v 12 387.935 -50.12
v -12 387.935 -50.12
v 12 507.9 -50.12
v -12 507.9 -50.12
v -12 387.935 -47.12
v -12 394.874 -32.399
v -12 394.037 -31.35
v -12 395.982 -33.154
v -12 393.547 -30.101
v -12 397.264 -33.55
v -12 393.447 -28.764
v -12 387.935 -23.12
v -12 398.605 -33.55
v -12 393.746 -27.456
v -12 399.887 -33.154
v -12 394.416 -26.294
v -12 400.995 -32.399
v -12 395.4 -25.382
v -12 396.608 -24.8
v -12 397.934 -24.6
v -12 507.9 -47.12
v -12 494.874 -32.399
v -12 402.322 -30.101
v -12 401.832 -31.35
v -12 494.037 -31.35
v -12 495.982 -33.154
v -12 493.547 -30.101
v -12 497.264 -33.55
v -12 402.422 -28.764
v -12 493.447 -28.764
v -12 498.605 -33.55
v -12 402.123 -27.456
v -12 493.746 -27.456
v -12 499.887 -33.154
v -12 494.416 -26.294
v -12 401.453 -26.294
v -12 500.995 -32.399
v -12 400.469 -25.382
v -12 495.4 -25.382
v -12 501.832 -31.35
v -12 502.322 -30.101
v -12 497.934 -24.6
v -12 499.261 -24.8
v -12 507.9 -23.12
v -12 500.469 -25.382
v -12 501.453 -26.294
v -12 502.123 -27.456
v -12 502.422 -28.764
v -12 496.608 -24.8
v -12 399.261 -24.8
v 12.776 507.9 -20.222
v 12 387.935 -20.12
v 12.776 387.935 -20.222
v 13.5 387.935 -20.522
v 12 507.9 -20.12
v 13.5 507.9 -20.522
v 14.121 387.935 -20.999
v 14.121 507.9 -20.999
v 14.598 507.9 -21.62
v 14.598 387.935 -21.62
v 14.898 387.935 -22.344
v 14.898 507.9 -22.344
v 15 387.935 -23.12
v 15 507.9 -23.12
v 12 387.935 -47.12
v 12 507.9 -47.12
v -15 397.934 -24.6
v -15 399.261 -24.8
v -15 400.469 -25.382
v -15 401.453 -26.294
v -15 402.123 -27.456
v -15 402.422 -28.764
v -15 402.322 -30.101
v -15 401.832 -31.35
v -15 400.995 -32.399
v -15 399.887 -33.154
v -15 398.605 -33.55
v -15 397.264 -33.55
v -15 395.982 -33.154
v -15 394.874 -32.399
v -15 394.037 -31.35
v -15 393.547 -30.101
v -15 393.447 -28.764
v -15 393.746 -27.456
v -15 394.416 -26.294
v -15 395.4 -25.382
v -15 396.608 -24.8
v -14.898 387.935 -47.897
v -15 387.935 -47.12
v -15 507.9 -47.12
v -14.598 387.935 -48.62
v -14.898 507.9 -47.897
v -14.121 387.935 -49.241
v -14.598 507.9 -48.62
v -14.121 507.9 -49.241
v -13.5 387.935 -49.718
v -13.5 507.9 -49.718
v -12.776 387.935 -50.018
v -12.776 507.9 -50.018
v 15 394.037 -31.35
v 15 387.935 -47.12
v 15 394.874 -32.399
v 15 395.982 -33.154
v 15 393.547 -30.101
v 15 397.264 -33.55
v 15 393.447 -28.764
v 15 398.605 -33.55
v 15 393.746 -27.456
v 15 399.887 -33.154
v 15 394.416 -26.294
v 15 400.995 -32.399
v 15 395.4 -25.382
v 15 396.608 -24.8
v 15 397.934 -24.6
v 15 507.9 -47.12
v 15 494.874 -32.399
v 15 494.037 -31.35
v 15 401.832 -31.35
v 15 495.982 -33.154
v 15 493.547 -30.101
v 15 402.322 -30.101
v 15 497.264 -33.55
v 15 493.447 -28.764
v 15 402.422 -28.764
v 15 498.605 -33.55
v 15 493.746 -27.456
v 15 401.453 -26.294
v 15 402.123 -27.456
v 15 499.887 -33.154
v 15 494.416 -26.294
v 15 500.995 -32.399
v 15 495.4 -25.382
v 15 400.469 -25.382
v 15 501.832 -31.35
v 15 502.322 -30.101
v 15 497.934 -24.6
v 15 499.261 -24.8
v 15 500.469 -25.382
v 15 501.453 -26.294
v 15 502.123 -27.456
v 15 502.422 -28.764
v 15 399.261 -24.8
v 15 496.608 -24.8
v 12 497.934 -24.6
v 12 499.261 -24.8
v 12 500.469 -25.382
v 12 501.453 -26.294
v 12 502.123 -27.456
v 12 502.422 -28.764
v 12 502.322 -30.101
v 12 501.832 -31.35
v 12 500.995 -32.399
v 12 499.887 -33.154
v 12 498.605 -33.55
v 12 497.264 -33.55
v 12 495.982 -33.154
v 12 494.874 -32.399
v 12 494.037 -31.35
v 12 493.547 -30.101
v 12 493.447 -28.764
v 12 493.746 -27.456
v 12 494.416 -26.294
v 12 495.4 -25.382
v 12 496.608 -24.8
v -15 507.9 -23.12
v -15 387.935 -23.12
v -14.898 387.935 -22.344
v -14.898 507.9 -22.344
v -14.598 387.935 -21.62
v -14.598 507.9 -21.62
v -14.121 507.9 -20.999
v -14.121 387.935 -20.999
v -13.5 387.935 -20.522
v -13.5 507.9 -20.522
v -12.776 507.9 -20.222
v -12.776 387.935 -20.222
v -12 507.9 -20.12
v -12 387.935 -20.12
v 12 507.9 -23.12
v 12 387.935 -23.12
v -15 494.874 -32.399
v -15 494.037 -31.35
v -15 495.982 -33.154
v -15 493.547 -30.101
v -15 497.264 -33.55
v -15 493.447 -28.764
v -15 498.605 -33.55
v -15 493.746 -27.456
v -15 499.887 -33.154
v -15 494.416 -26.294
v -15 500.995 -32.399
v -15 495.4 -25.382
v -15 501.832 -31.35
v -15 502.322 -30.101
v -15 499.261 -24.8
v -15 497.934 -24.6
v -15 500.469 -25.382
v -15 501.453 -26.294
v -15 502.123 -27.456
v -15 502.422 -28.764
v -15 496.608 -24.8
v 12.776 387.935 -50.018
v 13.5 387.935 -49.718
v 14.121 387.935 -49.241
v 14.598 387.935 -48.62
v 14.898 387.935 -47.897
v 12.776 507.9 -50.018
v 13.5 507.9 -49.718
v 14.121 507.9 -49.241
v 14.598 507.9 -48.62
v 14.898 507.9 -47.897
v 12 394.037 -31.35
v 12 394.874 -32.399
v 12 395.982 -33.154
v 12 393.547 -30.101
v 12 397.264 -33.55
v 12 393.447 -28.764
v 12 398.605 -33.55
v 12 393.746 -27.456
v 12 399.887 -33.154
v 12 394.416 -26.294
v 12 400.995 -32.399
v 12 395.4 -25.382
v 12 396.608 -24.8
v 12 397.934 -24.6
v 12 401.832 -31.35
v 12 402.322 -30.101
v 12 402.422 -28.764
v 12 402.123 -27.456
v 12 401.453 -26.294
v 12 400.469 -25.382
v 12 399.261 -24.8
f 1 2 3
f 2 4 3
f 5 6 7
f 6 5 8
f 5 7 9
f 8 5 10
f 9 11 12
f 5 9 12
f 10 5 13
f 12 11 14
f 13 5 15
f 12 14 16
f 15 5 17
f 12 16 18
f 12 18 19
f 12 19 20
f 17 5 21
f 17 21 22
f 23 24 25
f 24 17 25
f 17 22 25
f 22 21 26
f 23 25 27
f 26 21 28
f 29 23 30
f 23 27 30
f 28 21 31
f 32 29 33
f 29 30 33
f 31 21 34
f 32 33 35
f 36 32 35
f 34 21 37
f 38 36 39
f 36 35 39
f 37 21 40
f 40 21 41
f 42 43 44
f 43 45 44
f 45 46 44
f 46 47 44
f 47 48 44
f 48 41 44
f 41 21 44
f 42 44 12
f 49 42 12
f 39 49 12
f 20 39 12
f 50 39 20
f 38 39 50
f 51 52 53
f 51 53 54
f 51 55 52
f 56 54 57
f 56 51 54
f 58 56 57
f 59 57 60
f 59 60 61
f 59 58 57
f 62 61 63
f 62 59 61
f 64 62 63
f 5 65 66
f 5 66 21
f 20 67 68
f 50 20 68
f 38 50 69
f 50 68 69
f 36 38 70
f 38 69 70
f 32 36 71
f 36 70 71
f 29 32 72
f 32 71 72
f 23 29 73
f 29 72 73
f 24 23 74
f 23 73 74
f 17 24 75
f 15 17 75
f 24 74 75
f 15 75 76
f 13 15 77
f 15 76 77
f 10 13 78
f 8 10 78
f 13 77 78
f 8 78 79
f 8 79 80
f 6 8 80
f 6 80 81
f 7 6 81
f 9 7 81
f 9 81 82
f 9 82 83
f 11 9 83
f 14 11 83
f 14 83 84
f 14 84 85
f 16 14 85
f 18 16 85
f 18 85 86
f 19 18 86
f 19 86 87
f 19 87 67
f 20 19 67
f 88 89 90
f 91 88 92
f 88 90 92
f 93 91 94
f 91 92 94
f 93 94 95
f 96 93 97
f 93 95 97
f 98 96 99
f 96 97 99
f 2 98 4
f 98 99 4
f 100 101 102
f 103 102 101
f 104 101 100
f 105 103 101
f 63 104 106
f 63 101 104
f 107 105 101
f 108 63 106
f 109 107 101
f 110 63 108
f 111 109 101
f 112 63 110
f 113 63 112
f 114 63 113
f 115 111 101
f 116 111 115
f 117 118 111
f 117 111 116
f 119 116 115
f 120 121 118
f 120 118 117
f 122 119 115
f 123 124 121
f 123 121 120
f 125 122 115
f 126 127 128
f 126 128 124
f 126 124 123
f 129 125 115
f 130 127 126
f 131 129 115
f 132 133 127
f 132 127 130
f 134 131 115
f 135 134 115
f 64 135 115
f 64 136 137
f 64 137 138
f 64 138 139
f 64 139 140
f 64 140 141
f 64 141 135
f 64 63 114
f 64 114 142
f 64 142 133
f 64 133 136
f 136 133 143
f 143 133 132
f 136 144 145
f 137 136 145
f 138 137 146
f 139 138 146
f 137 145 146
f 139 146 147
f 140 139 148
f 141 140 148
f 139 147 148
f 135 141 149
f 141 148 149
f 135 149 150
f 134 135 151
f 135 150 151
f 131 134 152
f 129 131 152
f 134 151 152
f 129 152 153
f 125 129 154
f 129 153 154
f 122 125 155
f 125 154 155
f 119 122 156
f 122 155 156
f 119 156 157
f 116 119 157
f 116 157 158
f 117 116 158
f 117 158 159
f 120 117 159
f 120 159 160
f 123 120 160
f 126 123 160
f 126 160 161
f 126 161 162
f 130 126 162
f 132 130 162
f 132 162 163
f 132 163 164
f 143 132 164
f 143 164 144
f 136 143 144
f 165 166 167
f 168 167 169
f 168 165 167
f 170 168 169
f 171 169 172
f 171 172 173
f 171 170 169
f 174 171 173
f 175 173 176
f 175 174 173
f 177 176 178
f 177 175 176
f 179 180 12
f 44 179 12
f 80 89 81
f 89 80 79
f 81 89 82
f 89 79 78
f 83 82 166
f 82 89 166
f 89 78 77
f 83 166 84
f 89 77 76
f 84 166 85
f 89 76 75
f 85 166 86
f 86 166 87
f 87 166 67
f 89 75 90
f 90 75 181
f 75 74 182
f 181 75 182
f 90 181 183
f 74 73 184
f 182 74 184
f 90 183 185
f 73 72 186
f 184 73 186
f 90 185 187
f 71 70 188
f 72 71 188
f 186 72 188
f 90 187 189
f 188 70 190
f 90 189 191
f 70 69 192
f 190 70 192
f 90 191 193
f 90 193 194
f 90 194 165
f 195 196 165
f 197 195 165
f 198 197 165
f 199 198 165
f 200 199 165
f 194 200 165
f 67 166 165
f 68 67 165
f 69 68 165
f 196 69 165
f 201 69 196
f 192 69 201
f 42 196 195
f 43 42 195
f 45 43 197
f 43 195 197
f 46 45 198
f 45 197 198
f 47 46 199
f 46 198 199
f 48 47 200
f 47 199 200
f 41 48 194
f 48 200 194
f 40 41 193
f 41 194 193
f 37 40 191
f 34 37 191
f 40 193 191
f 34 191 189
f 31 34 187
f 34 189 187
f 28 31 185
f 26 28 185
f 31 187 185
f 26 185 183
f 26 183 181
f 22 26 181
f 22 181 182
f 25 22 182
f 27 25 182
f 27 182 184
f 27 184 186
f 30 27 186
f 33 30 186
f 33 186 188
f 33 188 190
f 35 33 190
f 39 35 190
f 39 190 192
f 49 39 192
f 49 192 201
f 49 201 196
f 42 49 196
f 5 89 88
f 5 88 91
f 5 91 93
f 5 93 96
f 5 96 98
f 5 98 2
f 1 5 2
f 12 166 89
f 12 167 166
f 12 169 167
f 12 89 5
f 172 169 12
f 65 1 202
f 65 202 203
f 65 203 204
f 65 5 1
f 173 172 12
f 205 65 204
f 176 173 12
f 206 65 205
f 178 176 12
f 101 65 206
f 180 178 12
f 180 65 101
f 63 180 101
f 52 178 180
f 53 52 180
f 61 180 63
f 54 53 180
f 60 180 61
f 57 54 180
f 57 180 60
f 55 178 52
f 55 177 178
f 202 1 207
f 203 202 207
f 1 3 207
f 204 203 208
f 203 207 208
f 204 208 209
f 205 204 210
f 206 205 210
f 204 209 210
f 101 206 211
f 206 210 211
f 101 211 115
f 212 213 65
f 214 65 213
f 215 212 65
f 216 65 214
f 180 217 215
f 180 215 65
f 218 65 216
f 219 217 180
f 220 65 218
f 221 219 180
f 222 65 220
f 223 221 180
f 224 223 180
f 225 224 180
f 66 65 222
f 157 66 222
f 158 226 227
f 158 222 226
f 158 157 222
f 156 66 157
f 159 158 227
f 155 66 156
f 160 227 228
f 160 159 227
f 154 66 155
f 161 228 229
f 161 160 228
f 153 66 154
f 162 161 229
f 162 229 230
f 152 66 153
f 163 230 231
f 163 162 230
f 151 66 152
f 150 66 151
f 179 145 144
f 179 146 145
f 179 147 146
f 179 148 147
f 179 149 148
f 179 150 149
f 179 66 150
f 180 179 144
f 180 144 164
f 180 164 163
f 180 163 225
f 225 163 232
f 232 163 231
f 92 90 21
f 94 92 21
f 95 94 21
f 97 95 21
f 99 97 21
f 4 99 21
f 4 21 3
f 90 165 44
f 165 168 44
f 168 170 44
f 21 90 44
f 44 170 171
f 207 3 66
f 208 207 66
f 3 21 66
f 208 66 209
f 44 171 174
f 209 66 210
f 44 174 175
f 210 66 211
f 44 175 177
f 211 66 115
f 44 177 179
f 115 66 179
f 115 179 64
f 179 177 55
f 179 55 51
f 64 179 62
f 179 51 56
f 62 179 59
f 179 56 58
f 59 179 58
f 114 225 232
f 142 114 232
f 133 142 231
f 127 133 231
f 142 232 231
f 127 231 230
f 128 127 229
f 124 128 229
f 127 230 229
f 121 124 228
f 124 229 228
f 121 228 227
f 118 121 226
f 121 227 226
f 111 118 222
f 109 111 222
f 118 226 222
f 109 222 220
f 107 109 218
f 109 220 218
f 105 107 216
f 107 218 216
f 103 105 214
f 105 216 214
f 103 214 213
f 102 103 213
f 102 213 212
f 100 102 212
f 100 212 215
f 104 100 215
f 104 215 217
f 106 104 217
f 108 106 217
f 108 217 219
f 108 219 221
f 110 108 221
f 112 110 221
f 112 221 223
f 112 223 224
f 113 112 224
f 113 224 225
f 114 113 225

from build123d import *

# Parameters (mm, degrees)
CROQUIS1_W                        = 30
CROQUIS1_H                        = 119.965463257
SALIENTE_EXTRUIR1_DEPTH           = 30
CROQUIS2_W                        = 24
CROQUIS2_H                        = 24
CORTAR_EXTRUIR1_DEPTH             = 120.965463257
DI_METRO_DE_TALADRO_9_0_9_1_D     = 9
DI_METRO_DE_TALADRO_9_0_9_1_DEPTH = 3
DI_METRO_DE_TALADRO_9_0_9_2_D     = 9
DI_METRO_DE_TALADRO_9_0_9_2_DEPTH = 30
REDONDEO1_R                       = 3


with BuildPart() as part:
    # Croquis1 → Saliente-Extruir1 (new body)
    with BuildSketch(Plane.XY.offset(-20.120137415)):
        with Locations((0, 447.917268372)):
            Rectangle(CROQUIS1_W, CROQUIS1_H)
    extrude(amount=-SALIENTE_EXTRUIR1_DEPTH)

    # Croquis2 → Cortar-Extruir1 (cut, through all)
    with BuildSketch(Plane(origin=(0, 507.9, 0), x_dir=(-1, 0, 0), z_dir=(0, 1, 0))):
        with Locations((0, -35.120137415)):
            Rectangle(CROQUIS2_W, CROQUIS2_H)
    extrude(amount=-CORTAR_EXTRUIR1_DEPTH, mode=Mode.SUBTRACT)

    # Diámetro de taladro Ø9.0 (9)1
    with Locations(Plane(origin=(-12, 0, 0), x_dir=(0, 0, -1), z_dir=(1, 0, 0))):
        with Locations((29.1, 397.9345), (29.1, 497.9345)):
            Hole(DI_METRO_DE_TALADRO_9_0_9_1_D / 2, depth=DI_METRO_DE_TALADRO_9_0_9_1_DEPTH)

    # Diámetro de taladro Ø9.0 (9)2
    with Locations(Plane(origin=(15, 0, 0), x_dir=(0, 0, -1), z_dir=(1, 0, 0))):
        with Locations((29.1, 497.9345), (29.1, 397.9345)):
            Hole(DI_METRO_DE_TALADRO_9_0_9_2_D / 2, depth=DI_METRO_DE_TALADRO_9_0_9_2_DEPTH)

    # Redondeo1
    redondeo1_edges = [part.edges().sort_by_distance(p)[0] for p in [
        (15, 447.917268372, -50.120137415),
        (-15, 447.917268372, -50.120137415),
        (15, 447.917268372, -20.120137415),
        (-15, 447.917268372, -20.120137415),
    ]]
    fillet(redondeo1_edges, radius=REDONDEO1_R)


solid = part.part
